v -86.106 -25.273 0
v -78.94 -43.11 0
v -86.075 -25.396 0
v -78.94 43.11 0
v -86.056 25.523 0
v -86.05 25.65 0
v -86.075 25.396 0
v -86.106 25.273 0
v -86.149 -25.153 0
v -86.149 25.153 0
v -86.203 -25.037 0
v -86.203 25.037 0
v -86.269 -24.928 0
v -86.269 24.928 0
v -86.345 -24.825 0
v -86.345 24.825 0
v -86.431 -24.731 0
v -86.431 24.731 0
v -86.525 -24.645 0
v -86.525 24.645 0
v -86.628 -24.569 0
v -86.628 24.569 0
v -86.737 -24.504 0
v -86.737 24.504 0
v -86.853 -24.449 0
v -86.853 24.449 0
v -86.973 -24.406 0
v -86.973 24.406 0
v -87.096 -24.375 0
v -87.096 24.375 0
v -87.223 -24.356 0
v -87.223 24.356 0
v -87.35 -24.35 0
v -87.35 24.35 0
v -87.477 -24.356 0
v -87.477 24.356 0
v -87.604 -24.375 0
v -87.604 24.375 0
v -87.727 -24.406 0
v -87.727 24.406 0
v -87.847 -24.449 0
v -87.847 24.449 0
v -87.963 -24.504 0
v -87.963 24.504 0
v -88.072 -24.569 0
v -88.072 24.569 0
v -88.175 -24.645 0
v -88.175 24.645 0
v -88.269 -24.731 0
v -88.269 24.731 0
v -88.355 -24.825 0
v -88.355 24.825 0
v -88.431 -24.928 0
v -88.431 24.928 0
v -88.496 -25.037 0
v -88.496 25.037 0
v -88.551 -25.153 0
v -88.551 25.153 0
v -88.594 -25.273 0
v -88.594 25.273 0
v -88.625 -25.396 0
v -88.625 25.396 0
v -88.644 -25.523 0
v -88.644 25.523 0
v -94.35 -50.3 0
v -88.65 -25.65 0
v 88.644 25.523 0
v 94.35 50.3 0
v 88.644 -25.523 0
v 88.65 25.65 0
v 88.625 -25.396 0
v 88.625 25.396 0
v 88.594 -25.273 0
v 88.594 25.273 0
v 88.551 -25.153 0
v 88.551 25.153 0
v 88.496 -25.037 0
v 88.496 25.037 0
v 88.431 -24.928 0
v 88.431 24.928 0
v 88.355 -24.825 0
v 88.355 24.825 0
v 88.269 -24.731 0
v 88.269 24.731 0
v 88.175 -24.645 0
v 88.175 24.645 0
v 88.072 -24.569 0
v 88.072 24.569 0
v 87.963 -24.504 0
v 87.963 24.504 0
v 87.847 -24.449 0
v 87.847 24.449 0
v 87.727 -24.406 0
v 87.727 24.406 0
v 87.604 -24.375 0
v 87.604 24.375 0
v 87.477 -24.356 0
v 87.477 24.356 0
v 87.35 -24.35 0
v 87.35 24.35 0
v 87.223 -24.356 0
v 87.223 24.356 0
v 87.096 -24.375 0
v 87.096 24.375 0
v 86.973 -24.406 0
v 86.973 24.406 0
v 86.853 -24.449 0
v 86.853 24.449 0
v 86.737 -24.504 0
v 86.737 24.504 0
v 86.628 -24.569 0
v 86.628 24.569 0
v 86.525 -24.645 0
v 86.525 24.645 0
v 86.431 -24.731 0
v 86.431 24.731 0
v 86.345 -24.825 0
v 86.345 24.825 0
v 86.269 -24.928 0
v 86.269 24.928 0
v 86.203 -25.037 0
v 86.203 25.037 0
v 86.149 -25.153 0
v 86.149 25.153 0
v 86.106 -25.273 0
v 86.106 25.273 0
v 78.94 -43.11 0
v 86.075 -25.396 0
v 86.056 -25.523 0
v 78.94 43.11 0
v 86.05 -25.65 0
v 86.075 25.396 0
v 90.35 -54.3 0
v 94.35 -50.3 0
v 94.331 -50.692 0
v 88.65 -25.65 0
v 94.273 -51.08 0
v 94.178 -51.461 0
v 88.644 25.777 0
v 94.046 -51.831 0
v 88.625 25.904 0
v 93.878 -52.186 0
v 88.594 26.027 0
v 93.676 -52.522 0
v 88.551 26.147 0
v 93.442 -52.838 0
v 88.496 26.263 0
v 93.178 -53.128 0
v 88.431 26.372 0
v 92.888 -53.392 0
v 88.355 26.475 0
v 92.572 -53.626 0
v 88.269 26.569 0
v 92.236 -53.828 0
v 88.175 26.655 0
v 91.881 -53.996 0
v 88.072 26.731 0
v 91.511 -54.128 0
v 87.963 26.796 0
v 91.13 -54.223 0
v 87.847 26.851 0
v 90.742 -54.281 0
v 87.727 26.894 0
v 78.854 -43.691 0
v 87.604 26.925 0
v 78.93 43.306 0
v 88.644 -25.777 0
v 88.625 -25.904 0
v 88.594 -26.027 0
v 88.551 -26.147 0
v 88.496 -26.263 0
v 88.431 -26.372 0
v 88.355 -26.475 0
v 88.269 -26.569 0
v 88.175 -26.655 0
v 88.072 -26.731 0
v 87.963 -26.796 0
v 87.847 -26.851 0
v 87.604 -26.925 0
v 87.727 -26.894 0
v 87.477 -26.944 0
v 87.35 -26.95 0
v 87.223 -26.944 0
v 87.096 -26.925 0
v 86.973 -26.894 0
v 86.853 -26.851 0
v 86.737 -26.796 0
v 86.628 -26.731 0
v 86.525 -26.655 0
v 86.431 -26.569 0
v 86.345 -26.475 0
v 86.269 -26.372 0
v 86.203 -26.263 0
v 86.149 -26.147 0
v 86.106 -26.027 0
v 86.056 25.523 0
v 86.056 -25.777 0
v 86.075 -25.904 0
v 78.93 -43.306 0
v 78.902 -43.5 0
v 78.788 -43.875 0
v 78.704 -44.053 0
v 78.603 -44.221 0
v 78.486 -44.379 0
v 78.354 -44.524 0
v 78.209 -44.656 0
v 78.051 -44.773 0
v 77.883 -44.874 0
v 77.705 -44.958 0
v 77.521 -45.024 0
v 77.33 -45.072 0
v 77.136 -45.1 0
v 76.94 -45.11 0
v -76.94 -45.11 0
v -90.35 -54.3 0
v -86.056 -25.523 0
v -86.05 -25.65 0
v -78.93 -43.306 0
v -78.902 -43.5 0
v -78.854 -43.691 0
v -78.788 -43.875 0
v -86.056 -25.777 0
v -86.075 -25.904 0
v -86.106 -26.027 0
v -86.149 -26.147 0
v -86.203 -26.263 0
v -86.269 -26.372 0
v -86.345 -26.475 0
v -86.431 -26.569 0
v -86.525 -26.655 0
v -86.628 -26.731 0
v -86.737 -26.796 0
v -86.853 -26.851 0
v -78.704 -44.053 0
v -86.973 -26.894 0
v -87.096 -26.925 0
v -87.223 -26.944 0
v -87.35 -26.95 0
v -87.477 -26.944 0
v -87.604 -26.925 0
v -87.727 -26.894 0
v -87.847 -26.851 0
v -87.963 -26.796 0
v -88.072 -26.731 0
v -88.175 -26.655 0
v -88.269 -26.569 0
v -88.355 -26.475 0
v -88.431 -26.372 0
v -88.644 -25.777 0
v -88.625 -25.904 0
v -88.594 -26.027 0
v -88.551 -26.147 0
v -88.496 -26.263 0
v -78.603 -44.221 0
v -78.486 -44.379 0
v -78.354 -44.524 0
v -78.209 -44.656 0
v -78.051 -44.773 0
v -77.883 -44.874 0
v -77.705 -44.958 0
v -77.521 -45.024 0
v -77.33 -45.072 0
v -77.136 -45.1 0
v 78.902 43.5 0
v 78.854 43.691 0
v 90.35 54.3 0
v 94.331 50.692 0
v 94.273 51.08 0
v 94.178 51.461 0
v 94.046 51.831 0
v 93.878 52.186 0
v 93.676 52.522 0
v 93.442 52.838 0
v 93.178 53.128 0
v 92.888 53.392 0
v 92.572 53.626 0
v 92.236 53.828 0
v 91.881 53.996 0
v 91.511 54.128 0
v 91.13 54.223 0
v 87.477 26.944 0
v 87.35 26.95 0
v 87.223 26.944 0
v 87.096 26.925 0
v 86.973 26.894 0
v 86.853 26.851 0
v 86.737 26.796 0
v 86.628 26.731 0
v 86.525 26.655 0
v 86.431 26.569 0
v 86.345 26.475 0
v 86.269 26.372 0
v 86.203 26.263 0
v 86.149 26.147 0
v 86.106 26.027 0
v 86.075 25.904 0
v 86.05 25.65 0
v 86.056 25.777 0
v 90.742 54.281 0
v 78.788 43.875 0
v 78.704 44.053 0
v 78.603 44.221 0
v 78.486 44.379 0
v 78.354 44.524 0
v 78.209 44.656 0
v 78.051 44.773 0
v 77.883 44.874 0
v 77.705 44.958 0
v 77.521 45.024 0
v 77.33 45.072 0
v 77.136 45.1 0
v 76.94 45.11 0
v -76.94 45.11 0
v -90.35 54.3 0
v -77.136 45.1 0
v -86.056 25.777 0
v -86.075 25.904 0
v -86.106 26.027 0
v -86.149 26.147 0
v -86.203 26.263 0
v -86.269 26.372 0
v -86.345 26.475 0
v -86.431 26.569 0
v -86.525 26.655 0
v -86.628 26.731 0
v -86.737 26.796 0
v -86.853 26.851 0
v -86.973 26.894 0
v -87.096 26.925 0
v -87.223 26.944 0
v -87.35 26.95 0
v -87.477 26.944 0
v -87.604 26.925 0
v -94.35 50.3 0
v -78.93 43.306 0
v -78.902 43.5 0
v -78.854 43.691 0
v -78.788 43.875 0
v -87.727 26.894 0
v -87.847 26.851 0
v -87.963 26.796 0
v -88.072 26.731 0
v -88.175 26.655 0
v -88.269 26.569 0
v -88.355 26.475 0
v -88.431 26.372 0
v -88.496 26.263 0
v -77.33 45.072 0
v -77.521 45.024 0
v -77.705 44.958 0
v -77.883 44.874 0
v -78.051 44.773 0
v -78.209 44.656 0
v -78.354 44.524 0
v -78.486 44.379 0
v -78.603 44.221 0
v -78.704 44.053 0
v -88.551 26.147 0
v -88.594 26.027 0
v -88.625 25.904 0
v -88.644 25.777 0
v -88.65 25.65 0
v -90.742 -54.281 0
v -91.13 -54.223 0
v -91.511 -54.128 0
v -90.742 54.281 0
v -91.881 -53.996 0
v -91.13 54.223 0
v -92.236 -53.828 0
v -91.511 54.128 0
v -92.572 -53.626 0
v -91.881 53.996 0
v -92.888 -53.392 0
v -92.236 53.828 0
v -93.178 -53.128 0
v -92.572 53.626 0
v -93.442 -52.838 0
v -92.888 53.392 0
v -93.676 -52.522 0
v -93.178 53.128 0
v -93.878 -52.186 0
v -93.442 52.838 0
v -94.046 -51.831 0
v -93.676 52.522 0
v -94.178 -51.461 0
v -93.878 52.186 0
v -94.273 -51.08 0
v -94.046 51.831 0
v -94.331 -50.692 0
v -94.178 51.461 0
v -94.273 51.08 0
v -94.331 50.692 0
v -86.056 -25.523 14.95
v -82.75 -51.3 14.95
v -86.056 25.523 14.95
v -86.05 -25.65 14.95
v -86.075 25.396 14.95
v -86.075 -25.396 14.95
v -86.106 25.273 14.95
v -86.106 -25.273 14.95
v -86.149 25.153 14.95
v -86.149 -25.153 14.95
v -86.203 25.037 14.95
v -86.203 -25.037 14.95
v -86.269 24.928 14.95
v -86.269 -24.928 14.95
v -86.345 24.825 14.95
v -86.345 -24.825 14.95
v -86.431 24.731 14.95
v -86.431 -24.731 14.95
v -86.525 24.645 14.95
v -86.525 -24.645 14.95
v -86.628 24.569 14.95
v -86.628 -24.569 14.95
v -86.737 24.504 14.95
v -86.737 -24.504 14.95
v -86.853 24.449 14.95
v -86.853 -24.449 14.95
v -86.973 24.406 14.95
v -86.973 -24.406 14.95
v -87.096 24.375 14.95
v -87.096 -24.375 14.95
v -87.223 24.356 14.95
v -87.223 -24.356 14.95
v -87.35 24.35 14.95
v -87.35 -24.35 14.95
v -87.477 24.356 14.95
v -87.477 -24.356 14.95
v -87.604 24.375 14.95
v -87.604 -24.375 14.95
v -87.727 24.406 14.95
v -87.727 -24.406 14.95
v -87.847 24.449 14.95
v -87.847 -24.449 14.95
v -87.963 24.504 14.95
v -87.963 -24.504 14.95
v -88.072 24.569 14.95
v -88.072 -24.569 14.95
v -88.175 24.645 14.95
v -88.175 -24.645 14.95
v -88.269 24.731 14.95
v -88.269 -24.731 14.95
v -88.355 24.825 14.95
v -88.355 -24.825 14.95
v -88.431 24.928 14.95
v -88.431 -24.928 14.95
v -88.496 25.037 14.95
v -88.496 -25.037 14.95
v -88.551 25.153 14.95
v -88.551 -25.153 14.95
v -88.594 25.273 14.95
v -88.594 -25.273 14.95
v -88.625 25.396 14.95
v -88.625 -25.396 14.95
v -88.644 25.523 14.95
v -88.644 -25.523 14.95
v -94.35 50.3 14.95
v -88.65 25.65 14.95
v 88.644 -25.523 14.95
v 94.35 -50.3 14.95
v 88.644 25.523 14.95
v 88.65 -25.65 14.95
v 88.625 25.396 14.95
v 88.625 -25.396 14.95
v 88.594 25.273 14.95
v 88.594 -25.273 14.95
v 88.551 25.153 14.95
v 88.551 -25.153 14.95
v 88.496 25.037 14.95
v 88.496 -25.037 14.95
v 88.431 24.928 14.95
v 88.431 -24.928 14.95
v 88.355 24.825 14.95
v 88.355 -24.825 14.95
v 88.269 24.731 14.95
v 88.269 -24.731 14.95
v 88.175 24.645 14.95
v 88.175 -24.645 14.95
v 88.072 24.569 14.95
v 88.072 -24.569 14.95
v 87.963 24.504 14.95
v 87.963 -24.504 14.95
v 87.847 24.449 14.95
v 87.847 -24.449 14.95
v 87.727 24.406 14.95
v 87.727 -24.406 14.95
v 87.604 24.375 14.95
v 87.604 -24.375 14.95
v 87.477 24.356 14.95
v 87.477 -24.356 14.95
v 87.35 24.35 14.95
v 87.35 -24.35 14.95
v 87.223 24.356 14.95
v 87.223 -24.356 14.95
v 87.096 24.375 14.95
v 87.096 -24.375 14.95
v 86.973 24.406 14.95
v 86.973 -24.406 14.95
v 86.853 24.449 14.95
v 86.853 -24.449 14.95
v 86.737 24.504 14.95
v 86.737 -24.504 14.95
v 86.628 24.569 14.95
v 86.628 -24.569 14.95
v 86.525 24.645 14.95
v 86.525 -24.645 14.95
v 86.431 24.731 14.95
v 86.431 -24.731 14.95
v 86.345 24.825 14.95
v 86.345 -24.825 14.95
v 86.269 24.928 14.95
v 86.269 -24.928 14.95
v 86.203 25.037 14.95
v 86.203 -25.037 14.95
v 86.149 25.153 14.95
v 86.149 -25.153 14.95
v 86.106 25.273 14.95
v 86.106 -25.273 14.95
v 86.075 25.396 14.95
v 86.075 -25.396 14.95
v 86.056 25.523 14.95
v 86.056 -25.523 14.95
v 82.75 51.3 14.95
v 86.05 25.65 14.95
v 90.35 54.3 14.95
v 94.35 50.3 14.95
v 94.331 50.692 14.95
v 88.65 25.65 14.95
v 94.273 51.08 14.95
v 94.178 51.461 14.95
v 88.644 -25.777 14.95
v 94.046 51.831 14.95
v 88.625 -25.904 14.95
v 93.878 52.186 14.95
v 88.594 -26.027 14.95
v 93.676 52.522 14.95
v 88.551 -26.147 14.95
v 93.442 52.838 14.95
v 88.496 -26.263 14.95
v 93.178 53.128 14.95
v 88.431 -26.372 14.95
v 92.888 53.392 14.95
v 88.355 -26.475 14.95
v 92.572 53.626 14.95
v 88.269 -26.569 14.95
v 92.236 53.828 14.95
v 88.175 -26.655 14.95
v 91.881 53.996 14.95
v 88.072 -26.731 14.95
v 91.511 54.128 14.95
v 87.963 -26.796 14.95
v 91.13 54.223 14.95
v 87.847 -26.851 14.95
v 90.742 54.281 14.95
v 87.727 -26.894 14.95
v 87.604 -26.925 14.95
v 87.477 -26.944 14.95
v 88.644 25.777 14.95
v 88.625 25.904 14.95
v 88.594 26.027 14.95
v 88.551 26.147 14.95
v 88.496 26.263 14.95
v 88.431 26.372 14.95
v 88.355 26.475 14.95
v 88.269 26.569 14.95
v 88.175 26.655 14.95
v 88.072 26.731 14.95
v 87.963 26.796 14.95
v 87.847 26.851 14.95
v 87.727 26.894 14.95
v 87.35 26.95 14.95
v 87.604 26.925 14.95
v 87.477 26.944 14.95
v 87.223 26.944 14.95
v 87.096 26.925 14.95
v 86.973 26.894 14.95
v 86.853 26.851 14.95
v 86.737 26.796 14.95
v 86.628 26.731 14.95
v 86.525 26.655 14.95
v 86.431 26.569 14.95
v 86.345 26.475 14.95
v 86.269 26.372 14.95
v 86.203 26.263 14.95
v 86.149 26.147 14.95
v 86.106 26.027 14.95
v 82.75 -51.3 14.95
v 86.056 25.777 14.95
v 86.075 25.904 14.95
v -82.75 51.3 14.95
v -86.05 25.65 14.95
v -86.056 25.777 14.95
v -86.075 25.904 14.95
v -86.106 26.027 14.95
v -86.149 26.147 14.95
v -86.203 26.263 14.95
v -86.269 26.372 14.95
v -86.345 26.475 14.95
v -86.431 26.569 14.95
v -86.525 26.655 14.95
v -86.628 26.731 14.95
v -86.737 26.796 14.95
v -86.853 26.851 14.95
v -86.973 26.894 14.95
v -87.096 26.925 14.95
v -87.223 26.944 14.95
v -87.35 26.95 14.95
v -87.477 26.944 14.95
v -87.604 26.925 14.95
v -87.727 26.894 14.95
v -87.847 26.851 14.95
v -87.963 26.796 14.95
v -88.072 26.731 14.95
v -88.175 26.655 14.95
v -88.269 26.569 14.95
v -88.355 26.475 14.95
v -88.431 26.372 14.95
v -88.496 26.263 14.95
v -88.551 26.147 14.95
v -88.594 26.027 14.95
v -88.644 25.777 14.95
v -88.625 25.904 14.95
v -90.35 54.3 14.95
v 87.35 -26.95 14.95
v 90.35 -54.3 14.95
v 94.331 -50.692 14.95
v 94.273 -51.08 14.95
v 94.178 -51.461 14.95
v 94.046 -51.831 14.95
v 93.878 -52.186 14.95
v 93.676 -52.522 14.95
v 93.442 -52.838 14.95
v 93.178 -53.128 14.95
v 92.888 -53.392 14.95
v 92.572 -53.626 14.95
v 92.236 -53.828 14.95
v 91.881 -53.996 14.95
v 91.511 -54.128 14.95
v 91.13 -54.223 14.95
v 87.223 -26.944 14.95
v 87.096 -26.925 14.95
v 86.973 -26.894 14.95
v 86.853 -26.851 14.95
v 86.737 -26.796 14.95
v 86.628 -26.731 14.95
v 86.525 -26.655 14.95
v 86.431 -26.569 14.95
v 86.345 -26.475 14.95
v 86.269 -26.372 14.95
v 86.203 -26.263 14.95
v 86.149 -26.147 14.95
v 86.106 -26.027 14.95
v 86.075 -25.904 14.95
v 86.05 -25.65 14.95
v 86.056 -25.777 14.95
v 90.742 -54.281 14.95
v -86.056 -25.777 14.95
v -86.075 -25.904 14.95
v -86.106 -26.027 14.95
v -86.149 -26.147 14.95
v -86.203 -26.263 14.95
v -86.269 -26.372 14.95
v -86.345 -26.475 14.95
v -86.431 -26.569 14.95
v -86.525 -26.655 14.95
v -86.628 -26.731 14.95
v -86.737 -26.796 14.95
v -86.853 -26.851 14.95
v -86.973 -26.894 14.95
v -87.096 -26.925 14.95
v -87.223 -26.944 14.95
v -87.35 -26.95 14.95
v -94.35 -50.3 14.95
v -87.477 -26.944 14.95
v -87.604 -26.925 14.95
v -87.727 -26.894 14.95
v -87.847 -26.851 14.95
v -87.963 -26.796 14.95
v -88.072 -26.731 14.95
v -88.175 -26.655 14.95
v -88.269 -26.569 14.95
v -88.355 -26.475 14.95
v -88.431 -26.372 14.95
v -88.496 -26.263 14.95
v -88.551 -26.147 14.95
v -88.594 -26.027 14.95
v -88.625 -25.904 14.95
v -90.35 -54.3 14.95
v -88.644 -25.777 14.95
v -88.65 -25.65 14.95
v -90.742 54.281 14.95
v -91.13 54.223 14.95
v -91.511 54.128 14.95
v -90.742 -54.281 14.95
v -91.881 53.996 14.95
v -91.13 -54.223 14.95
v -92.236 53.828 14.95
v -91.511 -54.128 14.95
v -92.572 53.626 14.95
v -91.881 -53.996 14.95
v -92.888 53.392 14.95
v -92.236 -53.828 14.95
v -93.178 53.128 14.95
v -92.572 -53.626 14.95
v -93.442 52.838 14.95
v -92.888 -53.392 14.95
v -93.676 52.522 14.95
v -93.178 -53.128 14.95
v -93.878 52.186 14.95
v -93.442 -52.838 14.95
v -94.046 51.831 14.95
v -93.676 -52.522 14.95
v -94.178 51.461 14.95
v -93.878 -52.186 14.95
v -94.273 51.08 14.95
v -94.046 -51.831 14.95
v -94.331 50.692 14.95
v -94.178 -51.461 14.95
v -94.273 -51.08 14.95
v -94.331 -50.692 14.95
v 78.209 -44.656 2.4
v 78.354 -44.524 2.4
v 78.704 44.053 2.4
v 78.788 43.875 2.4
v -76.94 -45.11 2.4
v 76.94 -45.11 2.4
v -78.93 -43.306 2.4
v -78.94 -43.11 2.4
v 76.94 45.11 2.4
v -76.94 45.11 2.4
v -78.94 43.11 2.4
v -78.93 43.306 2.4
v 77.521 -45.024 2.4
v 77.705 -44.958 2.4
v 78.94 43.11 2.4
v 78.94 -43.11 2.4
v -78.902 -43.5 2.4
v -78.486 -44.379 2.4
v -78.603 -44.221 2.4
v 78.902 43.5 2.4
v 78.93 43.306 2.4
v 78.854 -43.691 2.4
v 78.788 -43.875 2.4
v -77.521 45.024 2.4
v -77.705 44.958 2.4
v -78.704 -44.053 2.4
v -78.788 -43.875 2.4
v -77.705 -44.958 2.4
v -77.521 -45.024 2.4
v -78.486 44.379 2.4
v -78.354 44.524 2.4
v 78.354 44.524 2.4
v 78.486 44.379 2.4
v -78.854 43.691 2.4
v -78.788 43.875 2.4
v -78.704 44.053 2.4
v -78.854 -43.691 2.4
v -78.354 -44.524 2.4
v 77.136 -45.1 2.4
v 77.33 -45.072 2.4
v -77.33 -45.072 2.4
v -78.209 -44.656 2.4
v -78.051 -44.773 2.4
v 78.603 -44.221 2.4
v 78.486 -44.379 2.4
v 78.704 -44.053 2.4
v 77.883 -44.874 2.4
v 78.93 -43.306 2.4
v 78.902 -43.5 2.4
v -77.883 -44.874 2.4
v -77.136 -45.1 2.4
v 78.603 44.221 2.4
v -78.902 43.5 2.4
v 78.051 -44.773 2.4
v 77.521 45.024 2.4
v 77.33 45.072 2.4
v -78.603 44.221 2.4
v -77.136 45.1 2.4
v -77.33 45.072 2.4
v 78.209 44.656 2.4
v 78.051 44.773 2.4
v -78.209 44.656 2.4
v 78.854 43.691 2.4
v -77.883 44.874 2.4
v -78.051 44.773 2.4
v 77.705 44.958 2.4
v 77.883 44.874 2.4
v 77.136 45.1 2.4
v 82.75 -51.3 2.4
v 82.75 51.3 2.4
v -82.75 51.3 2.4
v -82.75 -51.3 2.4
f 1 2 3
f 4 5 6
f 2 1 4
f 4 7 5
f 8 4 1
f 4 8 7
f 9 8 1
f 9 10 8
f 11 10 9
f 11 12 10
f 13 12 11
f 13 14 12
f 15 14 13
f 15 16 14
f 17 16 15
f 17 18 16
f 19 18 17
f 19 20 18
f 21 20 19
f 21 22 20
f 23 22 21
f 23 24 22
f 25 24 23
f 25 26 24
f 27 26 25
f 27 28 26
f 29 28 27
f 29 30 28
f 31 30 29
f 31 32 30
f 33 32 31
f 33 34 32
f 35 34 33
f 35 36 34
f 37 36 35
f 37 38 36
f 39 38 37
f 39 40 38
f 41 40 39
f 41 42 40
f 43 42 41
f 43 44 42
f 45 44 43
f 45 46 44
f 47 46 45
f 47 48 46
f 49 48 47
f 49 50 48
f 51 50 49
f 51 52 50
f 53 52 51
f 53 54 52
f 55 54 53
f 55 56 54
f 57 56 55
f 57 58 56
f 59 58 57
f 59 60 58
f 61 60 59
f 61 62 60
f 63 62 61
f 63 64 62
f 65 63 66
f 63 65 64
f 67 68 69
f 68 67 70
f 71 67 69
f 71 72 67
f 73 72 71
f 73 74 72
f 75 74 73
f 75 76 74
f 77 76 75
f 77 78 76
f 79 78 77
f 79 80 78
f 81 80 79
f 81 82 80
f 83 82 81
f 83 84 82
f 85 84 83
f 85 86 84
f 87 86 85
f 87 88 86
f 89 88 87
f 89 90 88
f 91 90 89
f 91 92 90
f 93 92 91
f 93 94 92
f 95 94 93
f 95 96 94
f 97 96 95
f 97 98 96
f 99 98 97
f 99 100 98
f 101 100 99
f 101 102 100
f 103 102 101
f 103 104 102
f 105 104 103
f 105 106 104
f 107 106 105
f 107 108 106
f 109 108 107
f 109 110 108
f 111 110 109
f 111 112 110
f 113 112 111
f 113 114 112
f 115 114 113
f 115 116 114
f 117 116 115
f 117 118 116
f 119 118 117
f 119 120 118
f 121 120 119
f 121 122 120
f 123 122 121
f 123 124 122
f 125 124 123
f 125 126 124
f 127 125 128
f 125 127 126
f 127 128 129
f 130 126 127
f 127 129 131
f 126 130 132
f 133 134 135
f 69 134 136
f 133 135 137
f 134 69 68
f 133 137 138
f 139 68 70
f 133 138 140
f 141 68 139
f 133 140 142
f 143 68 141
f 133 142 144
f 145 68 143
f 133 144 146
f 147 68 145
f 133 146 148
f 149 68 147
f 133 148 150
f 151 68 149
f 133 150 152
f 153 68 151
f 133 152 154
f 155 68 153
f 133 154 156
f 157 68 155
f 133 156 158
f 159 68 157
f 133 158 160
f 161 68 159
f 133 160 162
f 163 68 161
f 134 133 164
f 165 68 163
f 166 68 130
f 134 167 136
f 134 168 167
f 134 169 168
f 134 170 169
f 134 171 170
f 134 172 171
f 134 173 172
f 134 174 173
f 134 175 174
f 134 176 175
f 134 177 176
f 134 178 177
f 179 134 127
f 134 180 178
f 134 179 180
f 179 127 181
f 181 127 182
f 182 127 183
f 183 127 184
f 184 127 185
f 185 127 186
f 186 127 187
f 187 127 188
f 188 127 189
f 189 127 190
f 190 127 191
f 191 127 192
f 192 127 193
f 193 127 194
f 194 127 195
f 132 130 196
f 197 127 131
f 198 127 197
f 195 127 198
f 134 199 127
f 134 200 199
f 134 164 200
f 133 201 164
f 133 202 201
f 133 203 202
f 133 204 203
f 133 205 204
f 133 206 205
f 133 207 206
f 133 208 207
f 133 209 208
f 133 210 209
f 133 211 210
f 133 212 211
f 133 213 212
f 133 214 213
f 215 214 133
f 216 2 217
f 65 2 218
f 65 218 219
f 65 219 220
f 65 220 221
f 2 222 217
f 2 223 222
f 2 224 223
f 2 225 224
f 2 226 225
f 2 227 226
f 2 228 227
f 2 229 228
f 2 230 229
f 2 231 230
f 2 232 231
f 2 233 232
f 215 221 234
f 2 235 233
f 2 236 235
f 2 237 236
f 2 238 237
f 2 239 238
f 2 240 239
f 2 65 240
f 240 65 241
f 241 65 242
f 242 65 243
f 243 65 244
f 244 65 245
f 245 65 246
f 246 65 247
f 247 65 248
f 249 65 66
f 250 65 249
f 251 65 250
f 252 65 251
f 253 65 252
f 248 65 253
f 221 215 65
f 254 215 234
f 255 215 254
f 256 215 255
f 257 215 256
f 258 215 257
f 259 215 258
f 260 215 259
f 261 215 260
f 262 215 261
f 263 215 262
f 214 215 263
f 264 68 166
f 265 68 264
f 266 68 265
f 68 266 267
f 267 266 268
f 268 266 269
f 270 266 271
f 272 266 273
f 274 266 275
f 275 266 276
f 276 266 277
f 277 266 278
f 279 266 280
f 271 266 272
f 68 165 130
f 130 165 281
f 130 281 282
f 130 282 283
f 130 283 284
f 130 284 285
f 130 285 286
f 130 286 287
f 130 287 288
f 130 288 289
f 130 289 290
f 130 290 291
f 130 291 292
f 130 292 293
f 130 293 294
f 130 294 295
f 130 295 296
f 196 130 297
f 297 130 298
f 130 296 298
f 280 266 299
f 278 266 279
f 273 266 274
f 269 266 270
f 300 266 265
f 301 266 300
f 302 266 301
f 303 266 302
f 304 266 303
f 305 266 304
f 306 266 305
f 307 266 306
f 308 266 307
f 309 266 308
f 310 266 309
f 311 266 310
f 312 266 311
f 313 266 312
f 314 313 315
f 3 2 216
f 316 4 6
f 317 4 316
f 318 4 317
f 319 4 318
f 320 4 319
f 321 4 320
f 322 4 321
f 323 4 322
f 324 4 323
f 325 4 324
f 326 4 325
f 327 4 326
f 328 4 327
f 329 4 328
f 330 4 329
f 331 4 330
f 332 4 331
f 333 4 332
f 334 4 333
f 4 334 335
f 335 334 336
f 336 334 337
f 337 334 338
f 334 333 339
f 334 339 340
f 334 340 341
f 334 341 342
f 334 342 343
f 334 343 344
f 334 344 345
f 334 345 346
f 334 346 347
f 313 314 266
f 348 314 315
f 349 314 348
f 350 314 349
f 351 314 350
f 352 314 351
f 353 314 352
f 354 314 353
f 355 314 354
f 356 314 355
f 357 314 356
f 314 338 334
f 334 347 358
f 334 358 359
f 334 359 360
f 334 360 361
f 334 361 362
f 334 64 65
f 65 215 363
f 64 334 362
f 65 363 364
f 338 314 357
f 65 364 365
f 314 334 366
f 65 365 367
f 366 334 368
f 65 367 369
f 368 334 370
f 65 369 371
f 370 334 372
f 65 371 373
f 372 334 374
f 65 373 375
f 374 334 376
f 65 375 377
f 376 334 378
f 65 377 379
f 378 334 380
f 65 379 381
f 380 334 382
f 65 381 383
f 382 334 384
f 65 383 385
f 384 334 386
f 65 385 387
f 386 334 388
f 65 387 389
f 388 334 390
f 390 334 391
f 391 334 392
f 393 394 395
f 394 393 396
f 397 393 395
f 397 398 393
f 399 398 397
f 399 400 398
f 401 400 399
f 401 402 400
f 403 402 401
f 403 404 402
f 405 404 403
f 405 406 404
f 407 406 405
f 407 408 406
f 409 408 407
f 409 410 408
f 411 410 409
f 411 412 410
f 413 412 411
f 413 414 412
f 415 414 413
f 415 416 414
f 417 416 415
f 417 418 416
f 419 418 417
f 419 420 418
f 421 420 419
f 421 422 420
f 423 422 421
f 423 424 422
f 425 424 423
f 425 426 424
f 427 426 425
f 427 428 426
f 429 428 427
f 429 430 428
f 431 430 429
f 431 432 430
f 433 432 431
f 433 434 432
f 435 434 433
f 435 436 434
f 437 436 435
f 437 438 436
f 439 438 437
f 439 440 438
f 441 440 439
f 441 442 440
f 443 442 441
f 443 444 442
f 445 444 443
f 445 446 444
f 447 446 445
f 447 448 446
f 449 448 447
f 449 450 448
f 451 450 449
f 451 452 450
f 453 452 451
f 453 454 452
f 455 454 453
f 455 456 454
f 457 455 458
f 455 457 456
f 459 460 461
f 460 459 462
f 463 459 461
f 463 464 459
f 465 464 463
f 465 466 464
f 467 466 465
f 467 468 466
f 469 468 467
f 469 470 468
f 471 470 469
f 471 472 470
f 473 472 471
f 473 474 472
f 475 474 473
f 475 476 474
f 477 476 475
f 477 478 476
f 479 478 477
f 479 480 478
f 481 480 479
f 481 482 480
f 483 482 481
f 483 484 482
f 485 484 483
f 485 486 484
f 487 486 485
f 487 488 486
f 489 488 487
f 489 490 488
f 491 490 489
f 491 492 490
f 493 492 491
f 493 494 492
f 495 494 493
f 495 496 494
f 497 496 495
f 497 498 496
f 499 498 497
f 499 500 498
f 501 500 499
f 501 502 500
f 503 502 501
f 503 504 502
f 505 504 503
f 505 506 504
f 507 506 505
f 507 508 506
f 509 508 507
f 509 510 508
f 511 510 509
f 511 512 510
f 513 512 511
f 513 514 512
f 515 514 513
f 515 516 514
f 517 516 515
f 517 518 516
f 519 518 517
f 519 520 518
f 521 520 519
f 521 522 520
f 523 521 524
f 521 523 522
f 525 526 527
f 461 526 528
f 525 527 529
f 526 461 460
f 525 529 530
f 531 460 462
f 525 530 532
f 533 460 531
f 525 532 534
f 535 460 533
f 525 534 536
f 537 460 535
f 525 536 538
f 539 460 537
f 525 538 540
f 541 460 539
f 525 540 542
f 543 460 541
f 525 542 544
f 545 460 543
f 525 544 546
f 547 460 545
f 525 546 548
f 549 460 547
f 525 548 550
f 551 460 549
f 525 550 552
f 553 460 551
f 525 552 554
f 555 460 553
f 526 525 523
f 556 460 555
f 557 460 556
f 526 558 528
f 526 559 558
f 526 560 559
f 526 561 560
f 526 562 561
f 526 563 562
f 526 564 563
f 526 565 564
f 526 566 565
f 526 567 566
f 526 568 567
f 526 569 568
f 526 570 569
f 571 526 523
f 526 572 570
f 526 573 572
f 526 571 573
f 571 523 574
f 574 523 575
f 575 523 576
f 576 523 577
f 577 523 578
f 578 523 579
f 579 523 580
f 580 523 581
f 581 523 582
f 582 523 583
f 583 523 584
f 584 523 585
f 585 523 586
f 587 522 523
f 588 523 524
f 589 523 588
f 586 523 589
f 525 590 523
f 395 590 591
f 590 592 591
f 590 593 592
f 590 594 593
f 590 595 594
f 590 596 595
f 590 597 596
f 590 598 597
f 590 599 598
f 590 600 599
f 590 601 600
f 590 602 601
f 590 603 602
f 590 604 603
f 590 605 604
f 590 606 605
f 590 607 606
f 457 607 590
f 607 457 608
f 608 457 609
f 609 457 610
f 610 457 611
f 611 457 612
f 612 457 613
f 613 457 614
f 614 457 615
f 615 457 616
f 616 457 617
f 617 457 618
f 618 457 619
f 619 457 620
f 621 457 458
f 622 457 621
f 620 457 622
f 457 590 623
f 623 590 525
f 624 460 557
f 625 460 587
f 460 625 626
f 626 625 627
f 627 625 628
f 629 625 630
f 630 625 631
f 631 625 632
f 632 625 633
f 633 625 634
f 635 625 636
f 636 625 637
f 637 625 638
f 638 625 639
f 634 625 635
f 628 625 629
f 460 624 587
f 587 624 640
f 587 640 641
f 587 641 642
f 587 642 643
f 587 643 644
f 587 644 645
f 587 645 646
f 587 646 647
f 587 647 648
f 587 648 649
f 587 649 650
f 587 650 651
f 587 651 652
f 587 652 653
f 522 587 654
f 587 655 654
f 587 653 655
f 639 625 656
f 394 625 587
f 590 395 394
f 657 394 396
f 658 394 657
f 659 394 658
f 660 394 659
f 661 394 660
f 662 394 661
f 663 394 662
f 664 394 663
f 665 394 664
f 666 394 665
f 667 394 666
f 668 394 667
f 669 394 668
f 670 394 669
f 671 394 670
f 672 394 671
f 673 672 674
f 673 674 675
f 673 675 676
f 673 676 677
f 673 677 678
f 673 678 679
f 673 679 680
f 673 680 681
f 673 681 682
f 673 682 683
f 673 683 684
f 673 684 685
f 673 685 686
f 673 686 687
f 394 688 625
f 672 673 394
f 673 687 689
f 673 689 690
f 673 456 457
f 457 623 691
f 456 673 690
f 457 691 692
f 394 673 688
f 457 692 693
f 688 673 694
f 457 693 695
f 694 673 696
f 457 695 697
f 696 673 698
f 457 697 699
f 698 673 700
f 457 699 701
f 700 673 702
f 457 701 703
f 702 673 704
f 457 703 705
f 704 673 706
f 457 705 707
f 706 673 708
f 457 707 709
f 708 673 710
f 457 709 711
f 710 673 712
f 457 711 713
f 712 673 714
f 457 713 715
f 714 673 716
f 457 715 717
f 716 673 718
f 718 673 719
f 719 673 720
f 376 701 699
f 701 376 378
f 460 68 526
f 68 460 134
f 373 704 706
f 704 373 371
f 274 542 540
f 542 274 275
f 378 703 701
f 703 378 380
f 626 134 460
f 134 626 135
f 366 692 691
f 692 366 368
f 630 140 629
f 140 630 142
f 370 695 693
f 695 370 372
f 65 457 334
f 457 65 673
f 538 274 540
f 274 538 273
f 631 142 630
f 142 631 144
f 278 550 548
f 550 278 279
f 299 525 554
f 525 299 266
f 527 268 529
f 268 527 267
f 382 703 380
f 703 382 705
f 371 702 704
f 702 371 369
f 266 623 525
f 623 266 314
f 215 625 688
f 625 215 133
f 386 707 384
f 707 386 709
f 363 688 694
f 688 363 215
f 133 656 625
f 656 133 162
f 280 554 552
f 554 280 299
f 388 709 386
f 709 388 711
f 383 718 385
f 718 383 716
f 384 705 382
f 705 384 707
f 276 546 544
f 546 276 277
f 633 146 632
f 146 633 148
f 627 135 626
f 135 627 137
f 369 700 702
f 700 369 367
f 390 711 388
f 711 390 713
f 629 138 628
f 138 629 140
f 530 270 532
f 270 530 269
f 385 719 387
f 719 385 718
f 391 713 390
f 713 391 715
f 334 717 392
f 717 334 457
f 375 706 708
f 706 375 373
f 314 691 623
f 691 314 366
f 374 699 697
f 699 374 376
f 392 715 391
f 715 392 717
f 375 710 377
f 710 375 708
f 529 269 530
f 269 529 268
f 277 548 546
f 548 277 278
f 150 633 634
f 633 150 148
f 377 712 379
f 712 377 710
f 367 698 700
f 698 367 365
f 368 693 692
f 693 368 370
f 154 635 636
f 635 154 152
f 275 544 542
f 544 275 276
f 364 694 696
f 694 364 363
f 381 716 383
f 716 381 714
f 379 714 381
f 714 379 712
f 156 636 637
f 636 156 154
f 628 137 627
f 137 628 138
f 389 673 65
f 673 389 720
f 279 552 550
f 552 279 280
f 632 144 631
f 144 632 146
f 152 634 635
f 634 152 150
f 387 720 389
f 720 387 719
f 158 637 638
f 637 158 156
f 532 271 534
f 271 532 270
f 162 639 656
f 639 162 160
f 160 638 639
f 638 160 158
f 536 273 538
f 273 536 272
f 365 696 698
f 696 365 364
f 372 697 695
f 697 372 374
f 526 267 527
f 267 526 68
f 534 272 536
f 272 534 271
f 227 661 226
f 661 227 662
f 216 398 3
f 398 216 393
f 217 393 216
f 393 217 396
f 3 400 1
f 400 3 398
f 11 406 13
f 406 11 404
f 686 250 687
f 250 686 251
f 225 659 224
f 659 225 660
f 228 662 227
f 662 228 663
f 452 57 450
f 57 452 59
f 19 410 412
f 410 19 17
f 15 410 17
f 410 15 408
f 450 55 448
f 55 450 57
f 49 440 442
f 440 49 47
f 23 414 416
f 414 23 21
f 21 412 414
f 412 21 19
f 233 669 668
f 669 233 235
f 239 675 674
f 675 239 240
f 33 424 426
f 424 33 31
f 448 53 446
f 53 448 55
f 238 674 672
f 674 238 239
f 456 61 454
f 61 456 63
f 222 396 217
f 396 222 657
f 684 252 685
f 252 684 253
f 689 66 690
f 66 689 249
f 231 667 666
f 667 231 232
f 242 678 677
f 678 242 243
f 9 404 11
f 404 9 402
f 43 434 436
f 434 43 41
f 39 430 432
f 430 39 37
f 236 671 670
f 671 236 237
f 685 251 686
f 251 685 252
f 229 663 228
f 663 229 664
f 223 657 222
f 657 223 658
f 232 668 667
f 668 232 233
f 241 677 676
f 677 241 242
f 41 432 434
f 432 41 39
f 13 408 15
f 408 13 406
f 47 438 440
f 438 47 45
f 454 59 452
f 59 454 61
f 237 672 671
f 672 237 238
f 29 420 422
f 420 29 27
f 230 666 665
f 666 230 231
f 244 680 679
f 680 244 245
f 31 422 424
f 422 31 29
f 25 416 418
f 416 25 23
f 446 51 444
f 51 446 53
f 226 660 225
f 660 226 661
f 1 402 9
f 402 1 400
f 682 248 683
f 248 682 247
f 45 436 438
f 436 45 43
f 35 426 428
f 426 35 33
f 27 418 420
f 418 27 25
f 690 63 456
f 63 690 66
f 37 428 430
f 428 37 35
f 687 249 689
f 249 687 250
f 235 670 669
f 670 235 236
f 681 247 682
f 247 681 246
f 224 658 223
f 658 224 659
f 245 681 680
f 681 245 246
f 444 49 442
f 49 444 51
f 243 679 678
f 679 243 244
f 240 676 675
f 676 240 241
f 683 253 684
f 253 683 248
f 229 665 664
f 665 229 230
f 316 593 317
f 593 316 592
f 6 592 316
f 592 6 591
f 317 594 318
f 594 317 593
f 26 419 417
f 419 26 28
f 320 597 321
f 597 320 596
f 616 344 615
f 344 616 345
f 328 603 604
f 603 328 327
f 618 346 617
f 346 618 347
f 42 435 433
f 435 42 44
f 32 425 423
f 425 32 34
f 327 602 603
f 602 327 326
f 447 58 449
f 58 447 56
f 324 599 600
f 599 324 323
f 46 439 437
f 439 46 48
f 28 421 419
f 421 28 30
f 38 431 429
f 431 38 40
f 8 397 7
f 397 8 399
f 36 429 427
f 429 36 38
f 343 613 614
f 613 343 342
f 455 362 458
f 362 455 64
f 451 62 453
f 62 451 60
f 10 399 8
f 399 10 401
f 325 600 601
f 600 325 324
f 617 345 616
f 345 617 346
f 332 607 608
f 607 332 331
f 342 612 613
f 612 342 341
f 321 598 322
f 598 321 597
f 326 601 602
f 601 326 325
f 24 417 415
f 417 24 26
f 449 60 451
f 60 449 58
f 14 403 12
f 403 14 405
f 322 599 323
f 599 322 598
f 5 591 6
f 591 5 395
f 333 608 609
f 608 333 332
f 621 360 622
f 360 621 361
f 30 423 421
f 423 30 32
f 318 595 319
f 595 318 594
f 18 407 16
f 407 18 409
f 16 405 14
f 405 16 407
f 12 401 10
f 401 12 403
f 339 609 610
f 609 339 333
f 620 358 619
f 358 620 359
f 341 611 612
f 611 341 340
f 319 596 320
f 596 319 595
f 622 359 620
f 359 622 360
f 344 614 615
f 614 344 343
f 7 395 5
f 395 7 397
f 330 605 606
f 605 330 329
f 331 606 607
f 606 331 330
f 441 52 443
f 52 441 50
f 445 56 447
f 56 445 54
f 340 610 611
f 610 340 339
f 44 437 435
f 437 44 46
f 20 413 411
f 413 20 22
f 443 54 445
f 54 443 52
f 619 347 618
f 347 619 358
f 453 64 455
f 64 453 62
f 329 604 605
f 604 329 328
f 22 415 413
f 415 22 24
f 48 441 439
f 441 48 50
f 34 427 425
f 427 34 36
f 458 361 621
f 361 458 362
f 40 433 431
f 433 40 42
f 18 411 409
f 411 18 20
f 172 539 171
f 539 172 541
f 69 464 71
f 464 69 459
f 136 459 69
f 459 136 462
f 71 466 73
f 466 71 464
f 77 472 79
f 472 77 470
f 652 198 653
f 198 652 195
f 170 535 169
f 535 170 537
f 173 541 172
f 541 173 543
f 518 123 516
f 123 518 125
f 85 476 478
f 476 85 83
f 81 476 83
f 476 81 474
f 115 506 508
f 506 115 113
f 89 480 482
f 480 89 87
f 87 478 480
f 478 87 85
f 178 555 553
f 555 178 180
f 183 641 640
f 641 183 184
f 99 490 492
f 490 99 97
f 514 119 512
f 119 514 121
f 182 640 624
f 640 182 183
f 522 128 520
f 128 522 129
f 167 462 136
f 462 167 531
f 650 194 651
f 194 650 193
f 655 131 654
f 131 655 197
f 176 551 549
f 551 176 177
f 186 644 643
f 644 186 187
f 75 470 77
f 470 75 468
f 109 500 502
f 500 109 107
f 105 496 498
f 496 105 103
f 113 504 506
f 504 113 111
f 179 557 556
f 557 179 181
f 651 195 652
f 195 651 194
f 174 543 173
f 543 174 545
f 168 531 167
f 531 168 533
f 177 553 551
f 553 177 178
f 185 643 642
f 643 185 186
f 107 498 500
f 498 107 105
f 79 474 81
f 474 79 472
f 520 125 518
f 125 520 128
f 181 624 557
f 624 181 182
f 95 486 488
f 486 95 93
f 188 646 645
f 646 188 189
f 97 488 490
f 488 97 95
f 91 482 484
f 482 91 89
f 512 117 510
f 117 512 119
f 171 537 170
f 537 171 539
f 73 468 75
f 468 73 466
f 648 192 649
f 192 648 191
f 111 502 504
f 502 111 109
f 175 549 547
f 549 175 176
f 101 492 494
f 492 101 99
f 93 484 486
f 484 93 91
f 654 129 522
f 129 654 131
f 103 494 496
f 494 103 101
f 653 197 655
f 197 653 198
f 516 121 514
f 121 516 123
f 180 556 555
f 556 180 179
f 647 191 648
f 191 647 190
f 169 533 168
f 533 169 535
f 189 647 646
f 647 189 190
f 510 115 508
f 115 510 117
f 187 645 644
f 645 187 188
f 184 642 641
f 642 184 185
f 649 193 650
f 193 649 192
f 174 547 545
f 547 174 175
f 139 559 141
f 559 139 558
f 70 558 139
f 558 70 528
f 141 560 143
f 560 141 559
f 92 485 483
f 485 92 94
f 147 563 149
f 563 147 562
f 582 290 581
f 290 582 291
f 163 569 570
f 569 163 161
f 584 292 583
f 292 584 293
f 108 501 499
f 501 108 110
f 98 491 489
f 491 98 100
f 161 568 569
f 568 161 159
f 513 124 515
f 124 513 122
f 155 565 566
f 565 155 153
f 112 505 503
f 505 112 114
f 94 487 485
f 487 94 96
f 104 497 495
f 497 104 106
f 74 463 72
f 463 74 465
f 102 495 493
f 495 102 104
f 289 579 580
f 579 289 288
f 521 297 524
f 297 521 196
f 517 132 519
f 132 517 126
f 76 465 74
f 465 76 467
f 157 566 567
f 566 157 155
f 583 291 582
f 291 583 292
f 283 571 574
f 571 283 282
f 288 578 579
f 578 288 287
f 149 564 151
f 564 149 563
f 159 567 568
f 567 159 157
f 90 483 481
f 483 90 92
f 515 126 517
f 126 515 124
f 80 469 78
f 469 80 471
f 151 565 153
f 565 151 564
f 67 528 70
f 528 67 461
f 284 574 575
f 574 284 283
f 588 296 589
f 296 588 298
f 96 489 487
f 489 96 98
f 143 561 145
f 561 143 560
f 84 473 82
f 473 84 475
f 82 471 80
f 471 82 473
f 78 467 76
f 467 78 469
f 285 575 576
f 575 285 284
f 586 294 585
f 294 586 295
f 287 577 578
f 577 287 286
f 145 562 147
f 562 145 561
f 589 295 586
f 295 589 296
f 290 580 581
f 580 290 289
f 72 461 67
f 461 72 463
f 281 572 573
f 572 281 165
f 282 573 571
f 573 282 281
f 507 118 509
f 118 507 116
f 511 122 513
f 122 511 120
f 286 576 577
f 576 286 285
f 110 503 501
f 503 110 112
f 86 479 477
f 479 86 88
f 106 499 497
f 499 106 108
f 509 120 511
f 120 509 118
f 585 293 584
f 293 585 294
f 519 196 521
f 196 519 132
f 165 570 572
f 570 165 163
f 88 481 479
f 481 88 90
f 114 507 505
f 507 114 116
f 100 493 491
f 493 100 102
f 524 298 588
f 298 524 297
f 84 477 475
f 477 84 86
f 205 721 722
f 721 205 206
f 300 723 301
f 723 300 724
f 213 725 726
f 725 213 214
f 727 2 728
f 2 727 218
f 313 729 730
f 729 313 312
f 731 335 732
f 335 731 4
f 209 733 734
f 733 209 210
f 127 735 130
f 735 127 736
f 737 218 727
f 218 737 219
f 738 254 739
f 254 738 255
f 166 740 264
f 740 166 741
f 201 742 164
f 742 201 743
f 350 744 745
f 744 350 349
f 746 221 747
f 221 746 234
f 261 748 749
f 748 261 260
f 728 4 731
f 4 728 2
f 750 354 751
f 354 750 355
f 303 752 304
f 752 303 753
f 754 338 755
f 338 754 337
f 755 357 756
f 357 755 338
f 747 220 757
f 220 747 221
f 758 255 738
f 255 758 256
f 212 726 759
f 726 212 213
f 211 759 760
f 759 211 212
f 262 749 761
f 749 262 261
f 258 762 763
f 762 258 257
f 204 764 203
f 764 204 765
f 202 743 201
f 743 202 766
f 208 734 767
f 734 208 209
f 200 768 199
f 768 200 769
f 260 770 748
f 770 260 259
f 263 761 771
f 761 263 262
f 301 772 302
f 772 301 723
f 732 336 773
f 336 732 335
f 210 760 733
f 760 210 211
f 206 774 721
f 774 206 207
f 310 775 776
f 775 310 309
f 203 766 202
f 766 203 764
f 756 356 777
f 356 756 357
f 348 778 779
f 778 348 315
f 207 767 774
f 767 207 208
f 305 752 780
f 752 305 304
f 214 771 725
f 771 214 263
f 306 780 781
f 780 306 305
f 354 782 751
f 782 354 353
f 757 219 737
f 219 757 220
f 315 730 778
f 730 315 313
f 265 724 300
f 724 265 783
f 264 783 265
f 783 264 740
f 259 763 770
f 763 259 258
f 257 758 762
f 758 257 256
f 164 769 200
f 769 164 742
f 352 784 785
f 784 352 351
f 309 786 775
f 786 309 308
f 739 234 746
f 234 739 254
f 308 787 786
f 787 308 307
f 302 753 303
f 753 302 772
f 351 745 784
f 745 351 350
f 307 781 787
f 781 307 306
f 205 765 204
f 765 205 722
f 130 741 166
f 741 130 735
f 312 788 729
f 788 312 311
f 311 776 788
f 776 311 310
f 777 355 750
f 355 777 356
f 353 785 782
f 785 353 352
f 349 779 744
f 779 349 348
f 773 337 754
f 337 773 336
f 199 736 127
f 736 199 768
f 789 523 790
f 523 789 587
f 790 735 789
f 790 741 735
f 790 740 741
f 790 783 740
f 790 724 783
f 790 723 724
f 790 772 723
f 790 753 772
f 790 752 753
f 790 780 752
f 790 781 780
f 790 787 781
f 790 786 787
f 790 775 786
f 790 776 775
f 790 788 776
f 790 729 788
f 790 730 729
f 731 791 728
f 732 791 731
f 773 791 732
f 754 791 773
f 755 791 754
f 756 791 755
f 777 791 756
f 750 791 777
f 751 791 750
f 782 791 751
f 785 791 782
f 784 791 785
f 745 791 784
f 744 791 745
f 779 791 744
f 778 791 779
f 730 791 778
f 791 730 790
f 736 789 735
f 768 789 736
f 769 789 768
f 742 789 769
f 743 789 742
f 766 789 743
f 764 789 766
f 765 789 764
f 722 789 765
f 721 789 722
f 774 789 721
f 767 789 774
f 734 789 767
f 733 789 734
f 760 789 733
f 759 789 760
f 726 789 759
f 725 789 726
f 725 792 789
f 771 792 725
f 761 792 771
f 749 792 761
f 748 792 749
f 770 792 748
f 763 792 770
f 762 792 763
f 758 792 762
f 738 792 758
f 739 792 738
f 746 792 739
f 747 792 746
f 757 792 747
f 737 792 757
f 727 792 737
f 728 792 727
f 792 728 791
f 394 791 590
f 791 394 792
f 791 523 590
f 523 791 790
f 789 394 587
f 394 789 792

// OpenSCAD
// MTG Kiosk - display cradle
//
// Holds the 7in DSI module (and, bolted to its back, the Pi 5) as the top
// surface of the table-centre enclosure. Screen faces up.
//
// Every dimension below is from the panel's own datasheet
// (7inch-DSI-Display_User_Manual-V1.1.pdf, section 3 "Dimensional Drawing"),
// not measured or guessed. Change a number here and re-render; nothing is
// hardcoded further down.
//
//   openscad -o display_cradle.stl display_cradle.scad
//   openscad -D part=\"retainer\" -o retainer.stl display_cradle.scad

// ---------------------------------------------------------------- parameters

// Panel, from the datasheet.
panel_w      = 164.90;  // PCB/BL outline
panel_h      = 102.00;
panel_t      = 12.25;   // "12.25 Total" on the side view
lens_w       = 164.28;  // LENS OD - the glass reaches almost to the PCB edge
lens_h       =  99.17;
active_w     = 154.68;  // V.A - never cover this
active_h     =  87.02;

// The module's own mounting holes: 154.89 x 91.92, centres 5mm in from each
// edge. Deliberately NOT used to retain the panel - see the note by the
// retainer below - but modelled so the clearance is real.
panel_hole_dx = 154.89;
panel_hole_dy =  91.92;

// Print tolerances. 0.3 is a comfortable slip fit on a well-tuned FDM printer;
// raise it if the panel is tight, lower it if it rattles.
fit          = 0.30;
wall         = 3.00;
floor_t      = 2.40;

// The window is sized to clear the active area with a visible margin, and is
// smaller than the lens so the frame has something to overlap. It CANNOT be
// pulled in far enough to reach the mounting holes: those sit 5mm from the
// edge while the active area starts 5.11mm from it, so any lip that reached a
// hole would be sitting on live screen. That is why the panel is trapped
// rather than screwed.
window_margin = 1.60;   // frame overlap onto the black border, per side

// Rear retainer.
retainer_t    = 3.00;
screw_d       = 3.20;   // M3 clearance
screw_head_d  = 6.20;
boss_d        = 8.00;

// Depth below the panel for the Pi 5 bolted to the panel's 58x49 holes on the
// supplied copper pillars, plus its connectors and the FPC ribbon's bend
// radius. The ribbon is the constraint, not the board.
rear_clearance = 34.00;

// Printer, measured on the unit (the manual's 252 x 180 x 152 is the carton or
// another variant). USB, DC in, the power rocker and the label inflow are all
// on the back, and the top face is clear - so the display can sit on top with
// nothing to work around.
printer_w    = 220.0;
printer_d    = 112.0;
printer_h    = 102.0;

// Height of the gap the riser opens up between the printer's top face and the
// cradle's underside. The Pi is bolted to the panel's back on the supplied
// copper pillars, so it hangs down into this space along with the FPC ribbon's
// bend and the USB and power tails that have to reach the back of the printer.
riser_h      = 42.0;
flange_t     = 3.0;

// Derived, not chosen. The outer plate is sized as boss centre + boss radius +
// `wall`, so a skirt exactly `wall` thick puts its inner surface precisely
// tangent to the bosses - which is not a solid, and OpenSCAD rightly refuses
// to call it 2-manifold. Making the skirt thicker than `wall` by a definite
// amount forces a real intersection, and keeps doing so if boss_d or wall
// change later.
riser_boss_overlap = 1.5;
riser_wall   = wall + riser_boss_overlap;

// Screws down into the printer's own top shell. Positions are echoed by the
// drill template so the holes get made once, in the right place.
mount_screw_d = 3.40;   // M3 clearance into a tapped shell
mount_dx      = 150.0;
mount_dy      =  74.0;

// Anchor pads for the label arm, inside the riser's back wall. Provided at
// both ends so the arm can go on whichever side suits the bench - the arm
// itself is handed only by which pair it bolts to.
//
// A full 3in roll is about 500g, which at this reach is roughly 0.3 Nm and
// well under a tenth of a MPa in a 12x25 section. Strength is not the
// question; the joint is, so it is four screws in a rectangle rather than two
// in a line, which is what actually resists the roll trying to rotate the
// bracket off the wall.
arm_mount_x   = 76.0;   // centre of the pair, from the riser's centreline
arm_mount_dx  = 22.0;
arm_mount_dz  = 18.0;
arm_mount_z   = 21.0;
arm_boss_d    =  8.0;
arm_boss_len  = 11.0;

part = "cradle";        // "cradle" | "retainer" | "riser" | "both"
                        // "template" (paper, panel fit) | "drill" (printer top)

$fn = 64;

// ------------------------------------------------------------------ geometry

pocket_w = panel_w + fit * 2;
pocket_h = panel_h + fit * 2;

window_w = active_w + window_margin * 2;
window_h = active_h + window_margin * 2;

// Retainer screws sit wholly outside the panel footprint, clear of the glass,
// and the outer plate is sized to contain them. An earlier version put the
// boss centres only half a wall out, so each boss was half-eaten by the panel
// pocket and still overhung the outer edge - visible the moment it was
// rendered, invisible in the echoed dimensions.
//
// They go beyond the panel's SHORT ends, two per end, rather than at the four
// corners. Corners cost boss diameter on both axes; the printer this mounts to
// measures 112mm across its narrow face, and a corner layout put the cradle at
// 125.8mm - overhanging by 7mm a side. Ends-only keeps the narrow axis to the
// panel plus two walls and spends the width on the long axis, where the
// printer has 220mm to give.
boss_inset = boss_d / 2 + 0.6;
boss_dx = pocket_w / 2 + boss_inset;
boss_dy = pocket_h / 4;          // paired across the short axis, inside it

outer_w  = (boss_dx + boss_d / 2 + wall) * 2;
outer_h  = pocket_h + wall * 2;

module boss_positions() {
  for (x = [-1, 1], y = [-1, 1]) translate([x * boss_dx, y * boss_dy, 0]) children();
}

module rounded_plate(w, h, t, r = 4) {
  hull() for (x = [-1, 1], y = [-1, 1])
    translate([x * (w / 2 - r), y * (h / 2 - r), 0]) cylinder(h = t, r = r);
}

// The frame the panel drops into from below, lens upward against the window.
module cradle() {
  difference() {
    union() {
      rounded_plate(outer_w, outer_h, floor_t + panel_t + fit);
      boss_positions() cylinder(h = floor_t + panel_t + fit, d = boss_d);
    }

    // Viewing window, through the top face.
    translate([0, 0, -1])
      rounded_plate(window_w, window_h, floor_t + 2, r = 2);

    // Panel pocket: starts at the window shoulder and runs out through the
    // rear face, so the module loads from behind. Written from an explicit
    // corner rather than centred - a centred cube here put the pocket half
    // below the floor, which quietly ate the window shoulder.
    translate([-pocket_w / 2, -pocket_h / 2, floor_t])
      cube([pocket_w, pocket_h, panel_t + fit + 1]);

    // Screw pilots for the retainer.
    boss_positions() translate([0, 0, -1])
      cylinder(h = floor_t + panel_t + fit + 2, d = screw_d - 0.6);
  }
}

// Trapping the panel rather than screwing through it is deliberate: the only
// holes it offers are level with the edge of the active area, so using them
// would mean a lip over live screen. This presses on the PCB back instead, and
// stays tolerant of a panel revision moving a hole.
module retainer() {
  difference() {
    union() {
      rounded_plate(outer_w, outer_h, retainer_t);
      boss_positions() cylinder(h = retainer_t, d = boss_d);
    }

    // Open the middle: the Pi bolts to the panel behind here, and the FPC has
    // to reach the DSI socket.
    rounded_plate(pocket_w - 16, pocket_h - 16, retainer_t * 3, r = 3);

    boss_positions() {
      translate([0, 0, -1]) cylinder(h = retainer_t + 2, d = screw_d);
      translate([0, 0, retainer_t - 1.8]) cylinder(h = 2, d = screw_head_d);
    }
  }
}

// A 1:1 paper template. Printed on paper and laid on the real panel, it shows
// whether the datasheet matches the hardware in hand before any filament is
// committed - the panel is third-party and the drawing is the only source.
module template() {
  difference() {
    rounded_plate(outer_w, outer_h, 0.4);
    translate([0, 0, -1]) rounded_plate(window_w, window_h, 3, r = 2);
    boss_positions() translate([0, 0, -1]) cylinder(h = 3, d = screw_d);
    // Panel outline scored, so the module can be laid straight onto it.
    difference() {
      translate([0, 0, -0.5]) cube([pocket_w, pocket_h, 3], center = true);
      translate([0, 0, -0.5]) cube([pocket_w - 0.8, pocket_h - 0.8, 4], center = true);
    }
  }
}

module mount_positions() {
  for (x = [-1, 1], y = [-1, 1]) translate([x * mount_dx / 2, y * mount_dy / 2, 0]) children();
}

// Four anchor points per end, on the inside of the back wall.
module arm_anchor_positions(side) {
  for (dx = [-1, 1], dz = [-1, 1])
    translate([side * arm_mount_x + dx * arm_mount_dx / 2,
               -outer_h / 2 + riser_wall,
               arm_mount_z + dz * arm_mount_dz / 2])
      rotate([-90, 0, 0]) children();
}

// Lifts the display clear of the printer's top so the Pi has somewhere to live.
// Open on all four sides: the Pi needs air, and its USB and power tails have to
// get to the back of the printer where every socket is.
module riser() {
  difference() {
    union() {
      // Bottom flange, screwed to the printer's top shell.
      rounded_plate(outer_w, outer_h, flange_t);
      // Skirt.
      difference() {
        rounded_plate(outer_w, outer_h, riser_h);
        translate([0, 0, -1])
          rounded_plate(outer_w - riser_wall * 2, outer_h - riser_wall * 2, riser_h + 2);
      }
      // Top bosses, aligned to the cradle's retainer screws so one screw per
      // corner carries cradle, retainer and riser together.
      boss_positions() cylinder(h = riser_h, d = boss_d);

      // Label-arm anchors. They sit at the ends of the back wall, outside the
      // Pi's 85mm width, so they take nothing away from the board's space.
      for (side = [-1, 1])
        arm_anchor_positions(side) cylinder(h = arm_boss_len, d = arm_boss_d);
    }

    // Screws up into the cradle.
    boss_positions() translate([0, 0, -1]) cylinder(h = riser_h + 2, d = screw_d);

    // Into the printer's top shell.
    mount_positions() {
      translate([0, 0, -1]) cylinder(h = flange_t + 2, d = mount_screw_d);
      translate([0, 0, flange_t - 1.4]) cylinder(h = 2, d = screw_head_d);
    }

    // Pilot holes through the back wall and into the arm anchors.
    for (side = [-1, 1])
      arm_anchor_positions(side) translate([0, 0, -riser_wall - 1])
        cylinder(h = arm_boss_len + riser_wall + 2, d = screw_d - 0.6);

    // Cable and air openings. The back one is wide because everything - USB to
    // the printer, USB-C power, and the label path - is behind the machine.
    for (side = [-1, 1])
      translate([0, side * (outer_h / 2), riser_h / 2 + flange_t / 2])
        cube([outer_w * 0.62, riser_wall * 4, riser_h - flange_t - 6], center = true);
    for (side = [-1, 1])
      translate([side * (outer_w / 2), 0, riser_h / 2 + flange_t / 2])
        cube([riser_wall * 4, outer_h * 0.45, riser_h - flange_t - 6], center = true);
  }
}

// 1:1 drilling guide for the printer's top face. Printed flat and laid on the
// printer, it puts the four holes exactly under the riser's flange - the shell
// only gets drilled once, and not by eye.
module drill_template() {
  difference() {
    rounded_plate(printer_w - 6, printer_d - 6, 1.6);
    mount_positions() translate([0, 0, -1]) cylinder(h = 4, d = mount_screw_d);
    // A window through the middle so the printer's own features stay visible
    // while the template is being lined up.
    rounded_plate(mount_dx - 30, mount_dy - 30, 6, r = 4);
  }
}

if (part == "cradle")        cradle();
else if (part == "retainer") retainer();
else if (part == "riser")    riser();
else if (part == "drill")    drill_template();
else if (part == "template") template();
else {
  cradle();
  translate([0, outer_h + 10, 0]) retainer();
}

echo(str("cradle footprint: ", outer_w, " x ", outer_h,
         " x ", floor_t + panel_t + fit, " mm"));
echo(str("window: ", window_w, " x ", window_h,
         " mm (active area ", active_w, " x ", active_h, ")"));
echo(str("total depth with Pi behind: ",
         floor_t + panel_t + fit + rear_clearance, " mm"));
